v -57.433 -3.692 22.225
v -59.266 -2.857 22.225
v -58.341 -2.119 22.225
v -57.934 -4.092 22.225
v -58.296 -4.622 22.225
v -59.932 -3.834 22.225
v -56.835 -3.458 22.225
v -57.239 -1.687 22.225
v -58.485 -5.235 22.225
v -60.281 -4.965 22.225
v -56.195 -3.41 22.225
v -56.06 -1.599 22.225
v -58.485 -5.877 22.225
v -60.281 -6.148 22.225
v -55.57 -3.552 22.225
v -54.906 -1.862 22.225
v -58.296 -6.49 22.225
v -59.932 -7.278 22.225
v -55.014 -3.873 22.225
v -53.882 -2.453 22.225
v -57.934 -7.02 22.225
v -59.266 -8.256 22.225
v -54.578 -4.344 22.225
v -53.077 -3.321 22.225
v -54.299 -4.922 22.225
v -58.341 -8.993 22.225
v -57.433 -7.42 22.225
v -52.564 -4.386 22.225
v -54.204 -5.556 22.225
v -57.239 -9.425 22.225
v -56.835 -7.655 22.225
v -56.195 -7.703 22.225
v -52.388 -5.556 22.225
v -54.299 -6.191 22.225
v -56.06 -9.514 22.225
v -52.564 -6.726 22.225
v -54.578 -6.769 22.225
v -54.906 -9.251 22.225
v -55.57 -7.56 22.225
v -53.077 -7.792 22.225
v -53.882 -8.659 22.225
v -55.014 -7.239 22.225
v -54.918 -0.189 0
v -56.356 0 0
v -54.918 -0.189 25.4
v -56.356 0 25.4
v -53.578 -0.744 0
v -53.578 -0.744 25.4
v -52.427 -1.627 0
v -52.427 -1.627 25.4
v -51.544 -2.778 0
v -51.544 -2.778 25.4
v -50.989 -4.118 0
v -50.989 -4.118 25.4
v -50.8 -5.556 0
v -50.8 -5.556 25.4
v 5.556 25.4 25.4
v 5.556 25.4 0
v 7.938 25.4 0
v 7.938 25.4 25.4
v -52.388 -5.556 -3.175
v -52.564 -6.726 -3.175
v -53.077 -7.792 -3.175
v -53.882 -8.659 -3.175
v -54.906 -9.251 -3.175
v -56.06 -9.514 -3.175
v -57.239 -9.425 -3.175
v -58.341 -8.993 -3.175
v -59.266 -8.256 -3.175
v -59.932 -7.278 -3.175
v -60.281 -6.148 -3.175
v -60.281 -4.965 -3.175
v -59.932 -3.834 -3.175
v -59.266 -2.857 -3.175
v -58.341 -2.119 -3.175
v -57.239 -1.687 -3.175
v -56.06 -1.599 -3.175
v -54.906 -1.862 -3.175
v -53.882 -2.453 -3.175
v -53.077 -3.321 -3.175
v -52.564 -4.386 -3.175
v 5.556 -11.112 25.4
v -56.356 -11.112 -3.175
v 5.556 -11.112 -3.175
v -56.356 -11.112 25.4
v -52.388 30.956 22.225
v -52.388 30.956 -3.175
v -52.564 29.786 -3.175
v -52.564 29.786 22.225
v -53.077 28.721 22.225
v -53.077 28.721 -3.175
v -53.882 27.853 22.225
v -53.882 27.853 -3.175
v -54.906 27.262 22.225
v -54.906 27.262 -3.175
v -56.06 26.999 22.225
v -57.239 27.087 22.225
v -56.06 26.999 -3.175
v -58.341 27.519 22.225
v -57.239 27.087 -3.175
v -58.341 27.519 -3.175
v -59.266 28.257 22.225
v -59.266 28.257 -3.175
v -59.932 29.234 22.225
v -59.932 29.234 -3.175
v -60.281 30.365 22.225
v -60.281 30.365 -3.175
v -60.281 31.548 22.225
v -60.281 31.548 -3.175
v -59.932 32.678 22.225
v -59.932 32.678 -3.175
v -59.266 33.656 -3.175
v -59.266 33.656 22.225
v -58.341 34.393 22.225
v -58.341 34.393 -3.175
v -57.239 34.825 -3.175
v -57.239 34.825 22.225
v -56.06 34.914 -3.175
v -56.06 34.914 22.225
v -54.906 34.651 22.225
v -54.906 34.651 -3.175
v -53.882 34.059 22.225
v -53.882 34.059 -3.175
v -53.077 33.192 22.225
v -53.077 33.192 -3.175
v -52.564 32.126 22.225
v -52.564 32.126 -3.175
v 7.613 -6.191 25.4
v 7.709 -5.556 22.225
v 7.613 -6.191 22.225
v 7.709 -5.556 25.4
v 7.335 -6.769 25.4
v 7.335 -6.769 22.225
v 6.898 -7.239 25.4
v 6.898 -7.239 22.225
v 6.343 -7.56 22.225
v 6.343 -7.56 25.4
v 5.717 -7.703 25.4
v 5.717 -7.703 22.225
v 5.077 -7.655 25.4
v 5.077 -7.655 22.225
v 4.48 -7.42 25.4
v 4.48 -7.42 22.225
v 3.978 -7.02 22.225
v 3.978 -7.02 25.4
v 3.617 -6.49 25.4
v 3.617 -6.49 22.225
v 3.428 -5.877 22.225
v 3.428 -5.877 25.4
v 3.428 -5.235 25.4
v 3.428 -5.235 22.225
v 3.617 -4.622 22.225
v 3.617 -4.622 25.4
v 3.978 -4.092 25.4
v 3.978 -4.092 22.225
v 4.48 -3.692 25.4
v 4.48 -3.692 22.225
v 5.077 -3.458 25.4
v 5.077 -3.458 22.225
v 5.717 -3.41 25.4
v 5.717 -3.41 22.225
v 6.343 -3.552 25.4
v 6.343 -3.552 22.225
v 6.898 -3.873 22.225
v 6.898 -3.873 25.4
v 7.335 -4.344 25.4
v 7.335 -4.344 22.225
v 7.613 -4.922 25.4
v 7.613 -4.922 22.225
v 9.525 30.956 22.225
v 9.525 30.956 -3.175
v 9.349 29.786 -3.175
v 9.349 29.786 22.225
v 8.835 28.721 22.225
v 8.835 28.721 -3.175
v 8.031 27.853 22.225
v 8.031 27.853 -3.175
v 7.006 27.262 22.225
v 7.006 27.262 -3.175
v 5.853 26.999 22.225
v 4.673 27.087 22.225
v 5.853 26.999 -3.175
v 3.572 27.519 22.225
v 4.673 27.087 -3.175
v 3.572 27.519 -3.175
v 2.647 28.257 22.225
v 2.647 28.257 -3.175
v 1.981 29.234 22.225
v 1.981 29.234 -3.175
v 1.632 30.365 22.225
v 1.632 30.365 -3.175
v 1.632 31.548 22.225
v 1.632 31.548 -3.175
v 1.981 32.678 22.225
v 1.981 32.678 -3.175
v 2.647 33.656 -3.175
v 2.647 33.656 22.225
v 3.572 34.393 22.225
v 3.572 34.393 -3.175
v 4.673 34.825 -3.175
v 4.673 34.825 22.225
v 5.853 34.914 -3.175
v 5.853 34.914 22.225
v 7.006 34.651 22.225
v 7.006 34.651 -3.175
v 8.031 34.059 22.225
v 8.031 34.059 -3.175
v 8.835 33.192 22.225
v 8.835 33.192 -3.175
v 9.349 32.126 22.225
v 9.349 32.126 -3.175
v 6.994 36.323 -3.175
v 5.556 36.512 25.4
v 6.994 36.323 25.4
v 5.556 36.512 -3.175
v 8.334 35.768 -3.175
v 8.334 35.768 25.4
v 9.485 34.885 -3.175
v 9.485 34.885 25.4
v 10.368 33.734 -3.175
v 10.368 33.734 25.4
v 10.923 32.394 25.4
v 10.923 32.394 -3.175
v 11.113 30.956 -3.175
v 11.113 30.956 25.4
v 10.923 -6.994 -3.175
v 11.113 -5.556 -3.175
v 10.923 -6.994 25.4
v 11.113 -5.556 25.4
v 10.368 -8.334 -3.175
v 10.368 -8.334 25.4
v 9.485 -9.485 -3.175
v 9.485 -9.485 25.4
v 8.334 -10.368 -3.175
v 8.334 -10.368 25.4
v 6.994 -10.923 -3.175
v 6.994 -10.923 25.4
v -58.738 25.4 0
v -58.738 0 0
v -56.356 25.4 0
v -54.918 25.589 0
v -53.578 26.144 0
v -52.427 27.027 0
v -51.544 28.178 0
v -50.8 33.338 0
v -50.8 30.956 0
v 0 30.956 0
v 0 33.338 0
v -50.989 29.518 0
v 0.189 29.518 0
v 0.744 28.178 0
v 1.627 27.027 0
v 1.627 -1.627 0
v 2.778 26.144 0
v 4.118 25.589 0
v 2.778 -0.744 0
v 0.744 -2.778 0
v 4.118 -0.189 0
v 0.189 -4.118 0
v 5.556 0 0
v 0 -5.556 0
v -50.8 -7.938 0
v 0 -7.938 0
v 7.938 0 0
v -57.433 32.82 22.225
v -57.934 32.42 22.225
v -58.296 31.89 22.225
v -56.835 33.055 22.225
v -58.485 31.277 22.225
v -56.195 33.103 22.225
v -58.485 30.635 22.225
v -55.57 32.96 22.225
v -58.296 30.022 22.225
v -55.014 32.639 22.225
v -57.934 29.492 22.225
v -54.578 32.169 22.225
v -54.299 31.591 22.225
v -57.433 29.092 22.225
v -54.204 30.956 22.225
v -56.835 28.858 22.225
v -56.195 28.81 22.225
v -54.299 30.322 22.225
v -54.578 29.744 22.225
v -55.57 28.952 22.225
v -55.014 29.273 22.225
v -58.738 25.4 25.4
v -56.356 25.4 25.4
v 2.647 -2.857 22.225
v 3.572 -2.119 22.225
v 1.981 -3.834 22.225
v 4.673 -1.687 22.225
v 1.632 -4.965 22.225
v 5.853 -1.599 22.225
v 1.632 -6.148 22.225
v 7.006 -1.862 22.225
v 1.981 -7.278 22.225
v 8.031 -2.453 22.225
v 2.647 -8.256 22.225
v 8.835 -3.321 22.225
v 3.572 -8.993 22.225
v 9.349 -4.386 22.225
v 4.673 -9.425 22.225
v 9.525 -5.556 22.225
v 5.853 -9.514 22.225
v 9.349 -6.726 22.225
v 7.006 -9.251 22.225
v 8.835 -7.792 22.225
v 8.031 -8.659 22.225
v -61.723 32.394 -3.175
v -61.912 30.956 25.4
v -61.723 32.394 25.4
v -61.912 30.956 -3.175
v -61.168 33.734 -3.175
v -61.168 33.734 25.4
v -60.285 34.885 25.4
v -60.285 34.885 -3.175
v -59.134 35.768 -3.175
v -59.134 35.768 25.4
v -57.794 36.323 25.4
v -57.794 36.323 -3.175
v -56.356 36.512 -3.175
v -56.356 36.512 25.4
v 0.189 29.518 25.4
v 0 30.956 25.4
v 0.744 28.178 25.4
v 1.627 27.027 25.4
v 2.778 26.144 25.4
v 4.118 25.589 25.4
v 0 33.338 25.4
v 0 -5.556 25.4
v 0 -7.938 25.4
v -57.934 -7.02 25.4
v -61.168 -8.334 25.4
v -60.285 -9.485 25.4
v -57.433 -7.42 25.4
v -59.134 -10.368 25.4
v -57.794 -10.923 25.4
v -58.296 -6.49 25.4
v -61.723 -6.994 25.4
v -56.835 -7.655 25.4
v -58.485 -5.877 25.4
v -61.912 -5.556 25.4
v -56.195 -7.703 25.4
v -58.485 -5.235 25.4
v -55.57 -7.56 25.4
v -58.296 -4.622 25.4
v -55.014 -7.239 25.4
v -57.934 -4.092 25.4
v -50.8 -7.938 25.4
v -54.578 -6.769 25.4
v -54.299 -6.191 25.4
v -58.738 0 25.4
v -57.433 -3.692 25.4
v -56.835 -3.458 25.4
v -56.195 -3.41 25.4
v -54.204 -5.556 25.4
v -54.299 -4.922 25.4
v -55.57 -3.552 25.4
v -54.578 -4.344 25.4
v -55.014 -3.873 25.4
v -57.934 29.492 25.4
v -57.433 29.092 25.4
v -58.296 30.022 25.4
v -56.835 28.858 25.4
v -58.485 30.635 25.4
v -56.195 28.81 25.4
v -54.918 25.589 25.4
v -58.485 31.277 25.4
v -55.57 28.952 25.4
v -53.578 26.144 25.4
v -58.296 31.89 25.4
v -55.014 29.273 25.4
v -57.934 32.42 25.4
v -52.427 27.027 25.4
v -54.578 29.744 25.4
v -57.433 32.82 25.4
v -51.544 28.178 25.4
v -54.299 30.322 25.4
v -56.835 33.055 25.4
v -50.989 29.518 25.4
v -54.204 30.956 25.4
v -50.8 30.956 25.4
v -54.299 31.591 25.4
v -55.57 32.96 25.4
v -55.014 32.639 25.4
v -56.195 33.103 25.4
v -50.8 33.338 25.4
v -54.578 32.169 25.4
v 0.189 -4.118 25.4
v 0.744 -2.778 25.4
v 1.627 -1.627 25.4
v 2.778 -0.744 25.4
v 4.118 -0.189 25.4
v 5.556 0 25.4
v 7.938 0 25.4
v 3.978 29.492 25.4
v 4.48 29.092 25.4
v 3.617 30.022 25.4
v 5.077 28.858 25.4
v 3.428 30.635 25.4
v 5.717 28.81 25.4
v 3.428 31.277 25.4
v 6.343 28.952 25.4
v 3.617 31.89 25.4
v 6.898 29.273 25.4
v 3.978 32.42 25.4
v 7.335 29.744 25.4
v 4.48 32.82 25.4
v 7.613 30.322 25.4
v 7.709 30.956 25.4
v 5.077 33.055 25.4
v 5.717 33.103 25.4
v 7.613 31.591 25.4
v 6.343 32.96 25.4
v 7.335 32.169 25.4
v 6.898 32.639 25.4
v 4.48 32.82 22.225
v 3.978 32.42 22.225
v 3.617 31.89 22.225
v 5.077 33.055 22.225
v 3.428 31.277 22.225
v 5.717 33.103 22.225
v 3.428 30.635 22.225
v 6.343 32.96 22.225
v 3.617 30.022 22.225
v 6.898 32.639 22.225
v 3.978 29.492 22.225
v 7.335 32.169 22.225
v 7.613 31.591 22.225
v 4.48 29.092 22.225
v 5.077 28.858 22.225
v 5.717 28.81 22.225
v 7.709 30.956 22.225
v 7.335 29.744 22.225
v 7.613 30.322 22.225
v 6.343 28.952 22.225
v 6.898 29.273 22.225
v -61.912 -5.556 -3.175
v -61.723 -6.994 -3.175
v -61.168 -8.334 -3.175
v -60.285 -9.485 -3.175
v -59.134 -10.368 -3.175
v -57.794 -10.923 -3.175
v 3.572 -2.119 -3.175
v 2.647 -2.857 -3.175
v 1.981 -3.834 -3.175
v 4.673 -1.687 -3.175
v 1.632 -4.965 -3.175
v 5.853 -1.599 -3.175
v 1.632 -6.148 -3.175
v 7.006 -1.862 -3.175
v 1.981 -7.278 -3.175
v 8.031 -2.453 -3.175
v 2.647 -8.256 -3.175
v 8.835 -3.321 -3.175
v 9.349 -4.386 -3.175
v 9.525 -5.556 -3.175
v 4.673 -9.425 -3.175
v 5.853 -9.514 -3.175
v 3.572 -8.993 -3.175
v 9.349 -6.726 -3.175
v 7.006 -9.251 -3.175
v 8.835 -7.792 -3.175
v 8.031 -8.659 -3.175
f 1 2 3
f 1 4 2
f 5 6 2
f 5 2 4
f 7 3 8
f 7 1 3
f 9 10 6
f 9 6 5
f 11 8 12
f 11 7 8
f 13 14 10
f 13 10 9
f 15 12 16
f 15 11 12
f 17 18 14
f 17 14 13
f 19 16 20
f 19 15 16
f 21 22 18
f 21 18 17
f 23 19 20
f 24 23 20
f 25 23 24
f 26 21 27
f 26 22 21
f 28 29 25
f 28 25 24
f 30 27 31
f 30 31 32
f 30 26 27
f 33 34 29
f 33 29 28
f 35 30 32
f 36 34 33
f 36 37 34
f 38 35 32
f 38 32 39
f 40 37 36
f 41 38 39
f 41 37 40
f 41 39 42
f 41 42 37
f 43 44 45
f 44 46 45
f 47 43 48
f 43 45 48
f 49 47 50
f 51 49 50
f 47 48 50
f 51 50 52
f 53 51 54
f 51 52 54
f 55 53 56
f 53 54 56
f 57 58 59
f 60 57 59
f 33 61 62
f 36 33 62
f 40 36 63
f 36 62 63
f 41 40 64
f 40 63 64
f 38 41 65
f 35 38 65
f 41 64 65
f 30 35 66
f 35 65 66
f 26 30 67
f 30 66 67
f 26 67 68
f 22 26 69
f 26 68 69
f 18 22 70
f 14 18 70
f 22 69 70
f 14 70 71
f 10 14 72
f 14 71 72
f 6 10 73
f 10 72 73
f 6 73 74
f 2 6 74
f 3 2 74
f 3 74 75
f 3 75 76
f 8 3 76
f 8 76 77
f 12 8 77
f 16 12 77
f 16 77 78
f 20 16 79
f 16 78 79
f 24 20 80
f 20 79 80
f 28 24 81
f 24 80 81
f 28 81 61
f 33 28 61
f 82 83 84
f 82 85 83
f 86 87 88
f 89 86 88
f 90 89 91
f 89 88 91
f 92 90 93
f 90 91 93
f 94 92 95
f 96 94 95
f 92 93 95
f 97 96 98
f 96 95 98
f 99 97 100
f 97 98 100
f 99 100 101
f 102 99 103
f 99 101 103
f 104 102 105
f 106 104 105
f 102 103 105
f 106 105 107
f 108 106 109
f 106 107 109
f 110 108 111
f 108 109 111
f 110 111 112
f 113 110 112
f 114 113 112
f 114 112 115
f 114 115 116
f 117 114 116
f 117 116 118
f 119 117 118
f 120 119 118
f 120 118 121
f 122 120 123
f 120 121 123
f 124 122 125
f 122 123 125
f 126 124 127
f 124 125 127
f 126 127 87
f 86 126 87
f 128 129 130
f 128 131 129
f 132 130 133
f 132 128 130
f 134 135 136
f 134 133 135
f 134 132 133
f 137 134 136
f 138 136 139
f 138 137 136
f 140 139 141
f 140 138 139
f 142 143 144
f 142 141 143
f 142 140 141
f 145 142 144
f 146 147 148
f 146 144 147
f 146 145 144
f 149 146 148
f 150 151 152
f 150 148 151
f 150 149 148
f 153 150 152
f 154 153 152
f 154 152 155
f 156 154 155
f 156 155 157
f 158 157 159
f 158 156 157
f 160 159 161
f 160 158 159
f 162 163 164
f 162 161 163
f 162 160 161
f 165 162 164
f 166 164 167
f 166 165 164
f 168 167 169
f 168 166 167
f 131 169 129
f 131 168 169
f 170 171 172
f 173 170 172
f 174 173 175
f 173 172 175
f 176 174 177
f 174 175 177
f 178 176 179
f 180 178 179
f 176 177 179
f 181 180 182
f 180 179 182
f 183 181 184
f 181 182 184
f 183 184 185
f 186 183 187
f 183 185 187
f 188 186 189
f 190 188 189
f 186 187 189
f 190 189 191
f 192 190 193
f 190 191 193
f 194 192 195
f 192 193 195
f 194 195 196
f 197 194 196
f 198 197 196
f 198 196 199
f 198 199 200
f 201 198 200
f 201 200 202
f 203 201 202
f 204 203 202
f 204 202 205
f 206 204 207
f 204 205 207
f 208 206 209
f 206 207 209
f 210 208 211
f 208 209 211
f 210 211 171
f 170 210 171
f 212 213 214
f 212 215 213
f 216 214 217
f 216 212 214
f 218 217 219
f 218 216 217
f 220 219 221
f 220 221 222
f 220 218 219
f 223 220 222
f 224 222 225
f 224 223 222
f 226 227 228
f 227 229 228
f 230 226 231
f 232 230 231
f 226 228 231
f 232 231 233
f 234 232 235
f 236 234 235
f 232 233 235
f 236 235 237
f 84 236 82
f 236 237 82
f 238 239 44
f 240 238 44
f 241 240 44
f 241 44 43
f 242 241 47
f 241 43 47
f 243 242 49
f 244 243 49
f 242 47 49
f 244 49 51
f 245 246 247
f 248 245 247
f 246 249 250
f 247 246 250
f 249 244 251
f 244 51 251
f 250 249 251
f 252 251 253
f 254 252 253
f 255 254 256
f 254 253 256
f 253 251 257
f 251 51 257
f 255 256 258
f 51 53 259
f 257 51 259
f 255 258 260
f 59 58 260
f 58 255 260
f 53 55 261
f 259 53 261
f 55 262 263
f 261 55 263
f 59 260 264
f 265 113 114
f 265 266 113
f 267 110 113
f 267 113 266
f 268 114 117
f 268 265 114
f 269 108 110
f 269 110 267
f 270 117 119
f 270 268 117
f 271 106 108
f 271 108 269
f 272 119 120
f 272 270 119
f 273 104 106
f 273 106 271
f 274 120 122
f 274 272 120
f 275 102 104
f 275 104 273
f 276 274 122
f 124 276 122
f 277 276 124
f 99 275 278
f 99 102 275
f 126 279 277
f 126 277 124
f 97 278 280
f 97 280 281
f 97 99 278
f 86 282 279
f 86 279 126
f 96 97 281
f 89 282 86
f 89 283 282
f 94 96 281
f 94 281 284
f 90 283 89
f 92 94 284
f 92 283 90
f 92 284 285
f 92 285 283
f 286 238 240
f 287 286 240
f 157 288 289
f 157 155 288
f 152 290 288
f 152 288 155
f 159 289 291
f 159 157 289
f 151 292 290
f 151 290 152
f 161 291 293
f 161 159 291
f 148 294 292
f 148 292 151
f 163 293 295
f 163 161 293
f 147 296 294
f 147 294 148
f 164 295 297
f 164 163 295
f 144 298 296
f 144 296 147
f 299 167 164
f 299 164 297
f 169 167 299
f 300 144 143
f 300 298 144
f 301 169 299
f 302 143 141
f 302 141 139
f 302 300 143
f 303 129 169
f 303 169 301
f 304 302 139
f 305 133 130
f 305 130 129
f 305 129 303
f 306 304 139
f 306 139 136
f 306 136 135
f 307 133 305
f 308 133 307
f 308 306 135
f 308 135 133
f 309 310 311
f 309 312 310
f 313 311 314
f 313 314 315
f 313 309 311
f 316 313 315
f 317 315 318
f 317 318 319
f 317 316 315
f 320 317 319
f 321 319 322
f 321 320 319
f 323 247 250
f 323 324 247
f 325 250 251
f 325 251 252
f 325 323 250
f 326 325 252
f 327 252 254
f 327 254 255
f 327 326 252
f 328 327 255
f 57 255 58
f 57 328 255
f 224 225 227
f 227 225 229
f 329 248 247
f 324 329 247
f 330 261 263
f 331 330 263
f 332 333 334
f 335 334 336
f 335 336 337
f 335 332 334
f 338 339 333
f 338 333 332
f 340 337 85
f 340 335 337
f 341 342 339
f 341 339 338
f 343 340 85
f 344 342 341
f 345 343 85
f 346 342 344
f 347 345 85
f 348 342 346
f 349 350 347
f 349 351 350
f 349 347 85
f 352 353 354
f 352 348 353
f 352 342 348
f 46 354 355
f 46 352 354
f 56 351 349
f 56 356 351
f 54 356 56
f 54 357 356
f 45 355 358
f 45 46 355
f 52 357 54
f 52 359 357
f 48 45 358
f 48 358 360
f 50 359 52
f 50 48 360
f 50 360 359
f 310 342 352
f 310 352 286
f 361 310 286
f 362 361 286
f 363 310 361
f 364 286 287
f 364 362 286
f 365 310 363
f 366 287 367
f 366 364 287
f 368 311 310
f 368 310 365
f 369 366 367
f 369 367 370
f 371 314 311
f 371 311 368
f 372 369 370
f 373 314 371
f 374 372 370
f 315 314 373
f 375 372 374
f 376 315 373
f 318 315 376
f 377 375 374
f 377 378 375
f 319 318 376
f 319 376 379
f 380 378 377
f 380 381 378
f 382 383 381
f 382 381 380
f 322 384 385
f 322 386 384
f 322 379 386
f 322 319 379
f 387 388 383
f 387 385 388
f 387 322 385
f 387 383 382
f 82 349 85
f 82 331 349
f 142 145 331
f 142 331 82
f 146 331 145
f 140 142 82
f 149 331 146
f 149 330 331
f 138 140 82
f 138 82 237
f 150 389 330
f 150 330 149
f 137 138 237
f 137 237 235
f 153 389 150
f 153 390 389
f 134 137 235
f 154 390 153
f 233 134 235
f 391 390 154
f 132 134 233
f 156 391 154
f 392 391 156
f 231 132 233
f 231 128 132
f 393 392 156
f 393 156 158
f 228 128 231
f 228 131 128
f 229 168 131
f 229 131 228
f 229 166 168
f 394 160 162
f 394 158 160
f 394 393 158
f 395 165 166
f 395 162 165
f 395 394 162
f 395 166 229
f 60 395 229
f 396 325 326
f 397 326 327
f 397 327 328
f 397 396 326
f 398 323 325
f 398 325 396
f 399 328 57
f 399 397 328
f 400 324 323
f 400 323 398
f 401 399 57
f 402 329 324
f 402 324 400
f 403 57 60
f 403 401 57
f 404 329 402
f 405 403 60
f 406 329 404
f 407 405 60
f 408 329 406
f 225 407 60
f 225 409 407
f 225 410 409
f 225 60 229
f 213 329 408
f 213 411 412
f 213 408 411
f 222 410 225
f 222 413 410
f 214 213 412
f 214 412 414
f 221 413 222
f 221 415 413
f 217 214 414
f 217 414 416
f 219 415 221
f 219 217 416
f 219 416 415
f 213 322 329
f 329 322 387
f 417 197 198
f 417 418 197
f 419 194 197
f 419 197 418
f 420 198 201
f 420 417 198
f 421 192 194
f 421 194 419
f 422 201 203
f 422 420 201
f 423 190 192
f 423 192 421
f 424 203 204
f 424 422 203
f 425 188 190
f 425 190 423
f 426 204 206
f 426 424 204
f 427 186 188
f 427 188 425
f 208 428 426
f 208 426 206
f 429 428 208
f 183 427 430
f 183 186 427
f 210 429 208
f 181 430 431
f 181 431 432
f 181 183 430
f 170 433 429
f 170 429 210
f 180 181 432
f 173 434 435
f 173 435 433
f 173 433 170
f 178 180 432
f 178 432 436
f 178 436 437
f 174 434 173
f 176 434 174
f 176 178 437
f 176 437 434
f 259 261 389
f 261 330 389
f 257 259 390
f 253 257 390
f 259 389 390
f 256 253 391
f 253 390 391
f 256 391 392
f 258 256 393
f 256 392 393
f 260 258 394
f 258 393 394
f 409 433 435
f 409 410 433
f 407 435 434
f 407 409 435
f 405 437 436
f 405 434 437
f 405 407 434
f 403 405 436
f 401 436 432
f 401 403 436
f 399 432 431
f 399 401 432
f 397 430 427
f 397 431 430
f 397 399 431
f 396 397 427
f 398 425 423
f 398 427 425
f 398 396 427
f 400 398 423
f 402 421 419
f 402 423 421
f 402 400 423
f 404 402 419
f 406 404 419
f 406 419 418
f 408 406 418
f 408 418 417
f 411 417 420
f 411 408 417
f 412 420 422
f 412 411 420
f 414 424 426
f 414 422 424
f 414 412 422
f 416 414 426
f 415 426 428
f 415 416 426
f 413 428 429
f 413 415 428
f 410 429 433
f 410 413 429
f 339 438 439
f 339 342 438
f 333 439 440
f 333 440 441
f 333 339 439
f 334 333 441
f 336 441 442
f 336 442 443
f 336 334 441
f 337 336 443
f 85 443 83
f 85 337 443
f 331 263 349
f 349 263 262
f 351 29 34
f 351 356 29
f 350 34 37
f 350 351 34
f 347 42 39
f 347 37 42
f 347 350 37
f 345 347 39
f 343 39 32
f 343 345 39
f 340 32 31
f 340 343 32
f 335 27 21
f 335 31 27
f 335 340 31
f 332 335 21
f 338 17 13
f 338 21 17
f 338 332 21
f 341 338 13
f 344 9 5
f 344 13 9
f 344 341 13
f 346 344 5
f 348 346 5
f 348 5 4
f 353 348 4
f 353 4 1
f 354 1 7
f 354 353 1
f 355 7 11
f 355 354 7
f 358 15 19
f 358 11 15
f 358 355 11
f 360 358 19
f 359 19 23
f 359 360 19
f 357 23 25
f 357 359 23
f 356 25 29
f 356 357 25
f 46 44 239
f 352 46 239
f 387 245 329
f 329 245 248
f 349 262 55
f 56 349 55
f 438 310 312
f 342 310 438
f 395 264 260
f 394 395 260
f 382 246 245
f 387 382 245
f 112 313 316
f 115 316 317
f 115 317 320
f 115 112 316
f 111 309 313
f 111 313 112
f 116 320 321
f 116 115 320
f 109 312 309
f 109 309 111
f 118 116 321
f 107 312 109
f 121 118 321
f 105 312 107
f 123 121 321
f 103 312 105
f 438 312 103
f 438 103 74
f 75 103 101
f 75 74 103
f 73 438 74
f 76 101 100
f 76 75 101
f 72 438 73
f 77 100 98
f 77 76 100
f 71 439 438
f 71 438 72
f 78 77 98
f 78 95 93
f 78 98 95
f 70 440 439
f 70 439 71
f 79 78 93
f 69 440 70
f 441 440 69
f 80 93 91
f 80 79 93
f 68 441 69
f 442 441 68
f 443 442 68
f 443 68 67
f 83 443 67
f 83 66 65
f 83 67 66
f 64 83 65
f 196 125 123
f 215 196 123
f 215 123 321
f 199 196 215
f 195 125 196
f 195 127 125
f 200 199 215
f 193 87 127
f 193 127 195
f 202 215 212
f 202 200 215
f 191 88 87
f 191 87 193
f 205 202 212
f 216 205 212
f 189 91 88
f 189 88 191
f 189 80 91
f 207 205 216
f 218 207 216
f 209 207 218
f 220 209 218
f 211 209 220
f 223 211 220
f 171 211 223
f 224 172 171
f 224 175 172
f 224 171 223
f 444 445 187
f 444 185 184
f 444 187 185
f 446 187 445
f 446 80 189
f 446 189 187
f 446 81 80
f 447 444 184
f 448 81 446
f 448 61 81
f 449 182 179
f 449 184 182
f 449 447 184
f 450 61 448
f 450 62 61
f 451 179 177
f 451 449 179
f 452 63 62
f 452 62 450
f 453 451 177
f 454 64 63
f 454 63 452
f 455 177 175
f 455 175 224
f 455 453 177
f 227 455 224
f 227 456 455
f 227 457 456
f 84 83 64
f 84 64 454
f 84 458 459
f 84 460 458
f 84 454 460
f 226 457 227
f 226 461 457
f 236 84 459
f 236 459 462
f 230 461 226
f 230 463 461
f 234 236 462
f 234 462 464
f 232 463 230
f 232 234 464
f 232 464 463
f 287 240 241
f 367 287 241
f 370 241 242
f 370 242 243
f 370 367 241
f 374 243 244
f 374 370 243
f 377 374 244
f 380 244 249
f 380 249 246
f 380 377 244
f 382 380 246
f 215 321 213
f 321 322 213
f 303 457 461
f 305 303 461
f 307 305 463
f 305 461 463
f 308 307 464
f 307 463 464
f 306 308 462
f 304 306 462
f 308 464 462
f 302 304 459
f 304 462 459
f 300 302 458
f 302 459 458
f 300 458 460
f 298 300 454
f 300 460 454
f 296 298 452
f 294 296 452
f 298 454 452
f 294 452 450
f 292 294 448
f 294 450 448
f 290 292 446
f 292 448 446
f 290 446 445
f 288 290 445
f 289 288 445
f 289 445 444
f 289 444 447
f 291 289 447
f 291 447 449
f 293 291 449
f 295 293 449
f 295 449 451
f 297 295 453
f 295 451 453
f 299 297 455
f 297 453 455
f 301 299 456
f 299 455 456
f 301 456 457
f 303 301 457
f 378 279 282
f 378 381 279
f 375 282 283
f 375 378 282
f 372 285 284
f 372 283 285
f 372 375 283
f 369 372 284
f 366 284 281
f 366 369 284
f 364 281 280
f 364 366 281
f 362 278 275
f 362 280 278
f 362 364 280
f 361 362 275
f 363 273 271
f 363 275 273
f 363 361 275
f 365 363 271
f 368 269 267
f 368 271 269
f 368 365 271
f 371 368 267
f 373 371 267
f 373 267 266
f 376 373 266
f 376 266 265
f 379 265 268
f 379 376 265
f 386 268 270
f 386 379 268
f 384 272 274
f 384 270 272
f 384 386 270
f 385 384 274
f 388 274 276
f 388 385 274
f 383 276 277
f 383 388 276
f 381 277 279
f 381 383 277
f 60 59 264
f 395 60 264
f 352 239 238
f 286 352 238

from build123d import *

# Parameters (mm, degrees)
F0_W     = 73.025
F0_H     = 47.625
F0_R     = 2.15265
F1_DEPTH = 25.4
F2_W     = 73.025
F2_H     = 47.625
F2_R     = 2.15265
F3_DEPTH = 3.175
F4_R     = 5.55625
F5_R     = 3.96875
F7_DEPTH = 25.4


with BuildPart() as f1:
    # F0 (on Top) → F1 (new body)
    with BuildSketch(Plane.XY):
        with Locations((-25.4, 12.7)):
            Rectangle(F0_W, F0_H)
        with Locations((-56.35625, -5.55625)):
            Circle(F0_R, mode=Mode.SUBTRACT)
        with Locations((5.55625, -5.55625)):
            Circle(F0_R, mode=Mode.SUBTRACT)
        Polygon((7.9375, 0), (0, 0), (0, -7.9375), (-50.8, -7.9375), (-50.8, 0), (-58.7375, 0), (-58.7375, 25.4), (-50.8, 25.4), (-50.8, 33.3375), (0, 33.3375), (0, 25.4), (7.9375, 25.4), align=None, mode=Mode.SUBTRACT)
        with Locations((-56.35625, 30.95625)):
            Circle(F0_R, mode=Mode.SUBTRACT)
        with Locations((5.55625, 30.95625)):
            Circle(F0_R, mode=Mode.SUBTRACT)
    extrude(amount=F1_DEPTH)

    # F2 (on face) → F3 (join)
    with BuildSketch(Plane(origin=(0, 0, 0), x_dir=(1, 0, 0), z_dir=(0, 0, -1))):
        with Locations((-25.4, -12.7)):
            Rectangle(F2_W, F2_H)
        with Locations((-56.35625, -30.95625)):
            Circle(F2_R, mode=Mode.SUBTRACT)
        with Locations((5.55625, -30.95625)):
            Circle(F2_R, mode=Mode.SUBTRACT)
        with Locations((-56.35625, 5.55625)):
            Circle(F2_R, mode=Mode.SUBTRACT)
        with Locations((5.55625, 5.55625)):
            Circle(F2_R, mode=Mode.SUBTRACT)
    extrude(amount=F3_DEPTH)

    # F4
    f4_edges = [f1.edges().sort_by_distance(p)[0] for p in [
        (-50.8, 25.4, 12.7),
        (-61.9125, 36.5125, 11.1125),
        (0, 25.4, 12.7),
        (11.1125, 36.5125, 11.1125),
        (0, 0, 12.7),
        (11.1125, -11.1125, 11.1125),
        (-50.8, 0, 12.7),
        (-61.9125, -11.1125, 11.1125),
    ]]
    fillet(f4_edges, radius=F4_R)

    # F5 (on face) → F7 (cut, through all)
    with BuildSketch(Plane(origin=(0, 0, -3.175), x_dir=(1, 0, 0), z_dir=(0, 0, -1))):
        with Locations((-56.35625, 5.55625)):
            Circle(F5_R)
        with Locations((5.55625, 5.55625)):
            Circle(F5_R)
        with Locations((5.55625, -30.95625)):
            Circle(F5_R)
        with Locations((-56.35625, -30.95625)):
            Circle(F5_R)
    extrude(amount=-F7_DEPTH, mode=Mode.SUBTRACT)


solid = f1.part
